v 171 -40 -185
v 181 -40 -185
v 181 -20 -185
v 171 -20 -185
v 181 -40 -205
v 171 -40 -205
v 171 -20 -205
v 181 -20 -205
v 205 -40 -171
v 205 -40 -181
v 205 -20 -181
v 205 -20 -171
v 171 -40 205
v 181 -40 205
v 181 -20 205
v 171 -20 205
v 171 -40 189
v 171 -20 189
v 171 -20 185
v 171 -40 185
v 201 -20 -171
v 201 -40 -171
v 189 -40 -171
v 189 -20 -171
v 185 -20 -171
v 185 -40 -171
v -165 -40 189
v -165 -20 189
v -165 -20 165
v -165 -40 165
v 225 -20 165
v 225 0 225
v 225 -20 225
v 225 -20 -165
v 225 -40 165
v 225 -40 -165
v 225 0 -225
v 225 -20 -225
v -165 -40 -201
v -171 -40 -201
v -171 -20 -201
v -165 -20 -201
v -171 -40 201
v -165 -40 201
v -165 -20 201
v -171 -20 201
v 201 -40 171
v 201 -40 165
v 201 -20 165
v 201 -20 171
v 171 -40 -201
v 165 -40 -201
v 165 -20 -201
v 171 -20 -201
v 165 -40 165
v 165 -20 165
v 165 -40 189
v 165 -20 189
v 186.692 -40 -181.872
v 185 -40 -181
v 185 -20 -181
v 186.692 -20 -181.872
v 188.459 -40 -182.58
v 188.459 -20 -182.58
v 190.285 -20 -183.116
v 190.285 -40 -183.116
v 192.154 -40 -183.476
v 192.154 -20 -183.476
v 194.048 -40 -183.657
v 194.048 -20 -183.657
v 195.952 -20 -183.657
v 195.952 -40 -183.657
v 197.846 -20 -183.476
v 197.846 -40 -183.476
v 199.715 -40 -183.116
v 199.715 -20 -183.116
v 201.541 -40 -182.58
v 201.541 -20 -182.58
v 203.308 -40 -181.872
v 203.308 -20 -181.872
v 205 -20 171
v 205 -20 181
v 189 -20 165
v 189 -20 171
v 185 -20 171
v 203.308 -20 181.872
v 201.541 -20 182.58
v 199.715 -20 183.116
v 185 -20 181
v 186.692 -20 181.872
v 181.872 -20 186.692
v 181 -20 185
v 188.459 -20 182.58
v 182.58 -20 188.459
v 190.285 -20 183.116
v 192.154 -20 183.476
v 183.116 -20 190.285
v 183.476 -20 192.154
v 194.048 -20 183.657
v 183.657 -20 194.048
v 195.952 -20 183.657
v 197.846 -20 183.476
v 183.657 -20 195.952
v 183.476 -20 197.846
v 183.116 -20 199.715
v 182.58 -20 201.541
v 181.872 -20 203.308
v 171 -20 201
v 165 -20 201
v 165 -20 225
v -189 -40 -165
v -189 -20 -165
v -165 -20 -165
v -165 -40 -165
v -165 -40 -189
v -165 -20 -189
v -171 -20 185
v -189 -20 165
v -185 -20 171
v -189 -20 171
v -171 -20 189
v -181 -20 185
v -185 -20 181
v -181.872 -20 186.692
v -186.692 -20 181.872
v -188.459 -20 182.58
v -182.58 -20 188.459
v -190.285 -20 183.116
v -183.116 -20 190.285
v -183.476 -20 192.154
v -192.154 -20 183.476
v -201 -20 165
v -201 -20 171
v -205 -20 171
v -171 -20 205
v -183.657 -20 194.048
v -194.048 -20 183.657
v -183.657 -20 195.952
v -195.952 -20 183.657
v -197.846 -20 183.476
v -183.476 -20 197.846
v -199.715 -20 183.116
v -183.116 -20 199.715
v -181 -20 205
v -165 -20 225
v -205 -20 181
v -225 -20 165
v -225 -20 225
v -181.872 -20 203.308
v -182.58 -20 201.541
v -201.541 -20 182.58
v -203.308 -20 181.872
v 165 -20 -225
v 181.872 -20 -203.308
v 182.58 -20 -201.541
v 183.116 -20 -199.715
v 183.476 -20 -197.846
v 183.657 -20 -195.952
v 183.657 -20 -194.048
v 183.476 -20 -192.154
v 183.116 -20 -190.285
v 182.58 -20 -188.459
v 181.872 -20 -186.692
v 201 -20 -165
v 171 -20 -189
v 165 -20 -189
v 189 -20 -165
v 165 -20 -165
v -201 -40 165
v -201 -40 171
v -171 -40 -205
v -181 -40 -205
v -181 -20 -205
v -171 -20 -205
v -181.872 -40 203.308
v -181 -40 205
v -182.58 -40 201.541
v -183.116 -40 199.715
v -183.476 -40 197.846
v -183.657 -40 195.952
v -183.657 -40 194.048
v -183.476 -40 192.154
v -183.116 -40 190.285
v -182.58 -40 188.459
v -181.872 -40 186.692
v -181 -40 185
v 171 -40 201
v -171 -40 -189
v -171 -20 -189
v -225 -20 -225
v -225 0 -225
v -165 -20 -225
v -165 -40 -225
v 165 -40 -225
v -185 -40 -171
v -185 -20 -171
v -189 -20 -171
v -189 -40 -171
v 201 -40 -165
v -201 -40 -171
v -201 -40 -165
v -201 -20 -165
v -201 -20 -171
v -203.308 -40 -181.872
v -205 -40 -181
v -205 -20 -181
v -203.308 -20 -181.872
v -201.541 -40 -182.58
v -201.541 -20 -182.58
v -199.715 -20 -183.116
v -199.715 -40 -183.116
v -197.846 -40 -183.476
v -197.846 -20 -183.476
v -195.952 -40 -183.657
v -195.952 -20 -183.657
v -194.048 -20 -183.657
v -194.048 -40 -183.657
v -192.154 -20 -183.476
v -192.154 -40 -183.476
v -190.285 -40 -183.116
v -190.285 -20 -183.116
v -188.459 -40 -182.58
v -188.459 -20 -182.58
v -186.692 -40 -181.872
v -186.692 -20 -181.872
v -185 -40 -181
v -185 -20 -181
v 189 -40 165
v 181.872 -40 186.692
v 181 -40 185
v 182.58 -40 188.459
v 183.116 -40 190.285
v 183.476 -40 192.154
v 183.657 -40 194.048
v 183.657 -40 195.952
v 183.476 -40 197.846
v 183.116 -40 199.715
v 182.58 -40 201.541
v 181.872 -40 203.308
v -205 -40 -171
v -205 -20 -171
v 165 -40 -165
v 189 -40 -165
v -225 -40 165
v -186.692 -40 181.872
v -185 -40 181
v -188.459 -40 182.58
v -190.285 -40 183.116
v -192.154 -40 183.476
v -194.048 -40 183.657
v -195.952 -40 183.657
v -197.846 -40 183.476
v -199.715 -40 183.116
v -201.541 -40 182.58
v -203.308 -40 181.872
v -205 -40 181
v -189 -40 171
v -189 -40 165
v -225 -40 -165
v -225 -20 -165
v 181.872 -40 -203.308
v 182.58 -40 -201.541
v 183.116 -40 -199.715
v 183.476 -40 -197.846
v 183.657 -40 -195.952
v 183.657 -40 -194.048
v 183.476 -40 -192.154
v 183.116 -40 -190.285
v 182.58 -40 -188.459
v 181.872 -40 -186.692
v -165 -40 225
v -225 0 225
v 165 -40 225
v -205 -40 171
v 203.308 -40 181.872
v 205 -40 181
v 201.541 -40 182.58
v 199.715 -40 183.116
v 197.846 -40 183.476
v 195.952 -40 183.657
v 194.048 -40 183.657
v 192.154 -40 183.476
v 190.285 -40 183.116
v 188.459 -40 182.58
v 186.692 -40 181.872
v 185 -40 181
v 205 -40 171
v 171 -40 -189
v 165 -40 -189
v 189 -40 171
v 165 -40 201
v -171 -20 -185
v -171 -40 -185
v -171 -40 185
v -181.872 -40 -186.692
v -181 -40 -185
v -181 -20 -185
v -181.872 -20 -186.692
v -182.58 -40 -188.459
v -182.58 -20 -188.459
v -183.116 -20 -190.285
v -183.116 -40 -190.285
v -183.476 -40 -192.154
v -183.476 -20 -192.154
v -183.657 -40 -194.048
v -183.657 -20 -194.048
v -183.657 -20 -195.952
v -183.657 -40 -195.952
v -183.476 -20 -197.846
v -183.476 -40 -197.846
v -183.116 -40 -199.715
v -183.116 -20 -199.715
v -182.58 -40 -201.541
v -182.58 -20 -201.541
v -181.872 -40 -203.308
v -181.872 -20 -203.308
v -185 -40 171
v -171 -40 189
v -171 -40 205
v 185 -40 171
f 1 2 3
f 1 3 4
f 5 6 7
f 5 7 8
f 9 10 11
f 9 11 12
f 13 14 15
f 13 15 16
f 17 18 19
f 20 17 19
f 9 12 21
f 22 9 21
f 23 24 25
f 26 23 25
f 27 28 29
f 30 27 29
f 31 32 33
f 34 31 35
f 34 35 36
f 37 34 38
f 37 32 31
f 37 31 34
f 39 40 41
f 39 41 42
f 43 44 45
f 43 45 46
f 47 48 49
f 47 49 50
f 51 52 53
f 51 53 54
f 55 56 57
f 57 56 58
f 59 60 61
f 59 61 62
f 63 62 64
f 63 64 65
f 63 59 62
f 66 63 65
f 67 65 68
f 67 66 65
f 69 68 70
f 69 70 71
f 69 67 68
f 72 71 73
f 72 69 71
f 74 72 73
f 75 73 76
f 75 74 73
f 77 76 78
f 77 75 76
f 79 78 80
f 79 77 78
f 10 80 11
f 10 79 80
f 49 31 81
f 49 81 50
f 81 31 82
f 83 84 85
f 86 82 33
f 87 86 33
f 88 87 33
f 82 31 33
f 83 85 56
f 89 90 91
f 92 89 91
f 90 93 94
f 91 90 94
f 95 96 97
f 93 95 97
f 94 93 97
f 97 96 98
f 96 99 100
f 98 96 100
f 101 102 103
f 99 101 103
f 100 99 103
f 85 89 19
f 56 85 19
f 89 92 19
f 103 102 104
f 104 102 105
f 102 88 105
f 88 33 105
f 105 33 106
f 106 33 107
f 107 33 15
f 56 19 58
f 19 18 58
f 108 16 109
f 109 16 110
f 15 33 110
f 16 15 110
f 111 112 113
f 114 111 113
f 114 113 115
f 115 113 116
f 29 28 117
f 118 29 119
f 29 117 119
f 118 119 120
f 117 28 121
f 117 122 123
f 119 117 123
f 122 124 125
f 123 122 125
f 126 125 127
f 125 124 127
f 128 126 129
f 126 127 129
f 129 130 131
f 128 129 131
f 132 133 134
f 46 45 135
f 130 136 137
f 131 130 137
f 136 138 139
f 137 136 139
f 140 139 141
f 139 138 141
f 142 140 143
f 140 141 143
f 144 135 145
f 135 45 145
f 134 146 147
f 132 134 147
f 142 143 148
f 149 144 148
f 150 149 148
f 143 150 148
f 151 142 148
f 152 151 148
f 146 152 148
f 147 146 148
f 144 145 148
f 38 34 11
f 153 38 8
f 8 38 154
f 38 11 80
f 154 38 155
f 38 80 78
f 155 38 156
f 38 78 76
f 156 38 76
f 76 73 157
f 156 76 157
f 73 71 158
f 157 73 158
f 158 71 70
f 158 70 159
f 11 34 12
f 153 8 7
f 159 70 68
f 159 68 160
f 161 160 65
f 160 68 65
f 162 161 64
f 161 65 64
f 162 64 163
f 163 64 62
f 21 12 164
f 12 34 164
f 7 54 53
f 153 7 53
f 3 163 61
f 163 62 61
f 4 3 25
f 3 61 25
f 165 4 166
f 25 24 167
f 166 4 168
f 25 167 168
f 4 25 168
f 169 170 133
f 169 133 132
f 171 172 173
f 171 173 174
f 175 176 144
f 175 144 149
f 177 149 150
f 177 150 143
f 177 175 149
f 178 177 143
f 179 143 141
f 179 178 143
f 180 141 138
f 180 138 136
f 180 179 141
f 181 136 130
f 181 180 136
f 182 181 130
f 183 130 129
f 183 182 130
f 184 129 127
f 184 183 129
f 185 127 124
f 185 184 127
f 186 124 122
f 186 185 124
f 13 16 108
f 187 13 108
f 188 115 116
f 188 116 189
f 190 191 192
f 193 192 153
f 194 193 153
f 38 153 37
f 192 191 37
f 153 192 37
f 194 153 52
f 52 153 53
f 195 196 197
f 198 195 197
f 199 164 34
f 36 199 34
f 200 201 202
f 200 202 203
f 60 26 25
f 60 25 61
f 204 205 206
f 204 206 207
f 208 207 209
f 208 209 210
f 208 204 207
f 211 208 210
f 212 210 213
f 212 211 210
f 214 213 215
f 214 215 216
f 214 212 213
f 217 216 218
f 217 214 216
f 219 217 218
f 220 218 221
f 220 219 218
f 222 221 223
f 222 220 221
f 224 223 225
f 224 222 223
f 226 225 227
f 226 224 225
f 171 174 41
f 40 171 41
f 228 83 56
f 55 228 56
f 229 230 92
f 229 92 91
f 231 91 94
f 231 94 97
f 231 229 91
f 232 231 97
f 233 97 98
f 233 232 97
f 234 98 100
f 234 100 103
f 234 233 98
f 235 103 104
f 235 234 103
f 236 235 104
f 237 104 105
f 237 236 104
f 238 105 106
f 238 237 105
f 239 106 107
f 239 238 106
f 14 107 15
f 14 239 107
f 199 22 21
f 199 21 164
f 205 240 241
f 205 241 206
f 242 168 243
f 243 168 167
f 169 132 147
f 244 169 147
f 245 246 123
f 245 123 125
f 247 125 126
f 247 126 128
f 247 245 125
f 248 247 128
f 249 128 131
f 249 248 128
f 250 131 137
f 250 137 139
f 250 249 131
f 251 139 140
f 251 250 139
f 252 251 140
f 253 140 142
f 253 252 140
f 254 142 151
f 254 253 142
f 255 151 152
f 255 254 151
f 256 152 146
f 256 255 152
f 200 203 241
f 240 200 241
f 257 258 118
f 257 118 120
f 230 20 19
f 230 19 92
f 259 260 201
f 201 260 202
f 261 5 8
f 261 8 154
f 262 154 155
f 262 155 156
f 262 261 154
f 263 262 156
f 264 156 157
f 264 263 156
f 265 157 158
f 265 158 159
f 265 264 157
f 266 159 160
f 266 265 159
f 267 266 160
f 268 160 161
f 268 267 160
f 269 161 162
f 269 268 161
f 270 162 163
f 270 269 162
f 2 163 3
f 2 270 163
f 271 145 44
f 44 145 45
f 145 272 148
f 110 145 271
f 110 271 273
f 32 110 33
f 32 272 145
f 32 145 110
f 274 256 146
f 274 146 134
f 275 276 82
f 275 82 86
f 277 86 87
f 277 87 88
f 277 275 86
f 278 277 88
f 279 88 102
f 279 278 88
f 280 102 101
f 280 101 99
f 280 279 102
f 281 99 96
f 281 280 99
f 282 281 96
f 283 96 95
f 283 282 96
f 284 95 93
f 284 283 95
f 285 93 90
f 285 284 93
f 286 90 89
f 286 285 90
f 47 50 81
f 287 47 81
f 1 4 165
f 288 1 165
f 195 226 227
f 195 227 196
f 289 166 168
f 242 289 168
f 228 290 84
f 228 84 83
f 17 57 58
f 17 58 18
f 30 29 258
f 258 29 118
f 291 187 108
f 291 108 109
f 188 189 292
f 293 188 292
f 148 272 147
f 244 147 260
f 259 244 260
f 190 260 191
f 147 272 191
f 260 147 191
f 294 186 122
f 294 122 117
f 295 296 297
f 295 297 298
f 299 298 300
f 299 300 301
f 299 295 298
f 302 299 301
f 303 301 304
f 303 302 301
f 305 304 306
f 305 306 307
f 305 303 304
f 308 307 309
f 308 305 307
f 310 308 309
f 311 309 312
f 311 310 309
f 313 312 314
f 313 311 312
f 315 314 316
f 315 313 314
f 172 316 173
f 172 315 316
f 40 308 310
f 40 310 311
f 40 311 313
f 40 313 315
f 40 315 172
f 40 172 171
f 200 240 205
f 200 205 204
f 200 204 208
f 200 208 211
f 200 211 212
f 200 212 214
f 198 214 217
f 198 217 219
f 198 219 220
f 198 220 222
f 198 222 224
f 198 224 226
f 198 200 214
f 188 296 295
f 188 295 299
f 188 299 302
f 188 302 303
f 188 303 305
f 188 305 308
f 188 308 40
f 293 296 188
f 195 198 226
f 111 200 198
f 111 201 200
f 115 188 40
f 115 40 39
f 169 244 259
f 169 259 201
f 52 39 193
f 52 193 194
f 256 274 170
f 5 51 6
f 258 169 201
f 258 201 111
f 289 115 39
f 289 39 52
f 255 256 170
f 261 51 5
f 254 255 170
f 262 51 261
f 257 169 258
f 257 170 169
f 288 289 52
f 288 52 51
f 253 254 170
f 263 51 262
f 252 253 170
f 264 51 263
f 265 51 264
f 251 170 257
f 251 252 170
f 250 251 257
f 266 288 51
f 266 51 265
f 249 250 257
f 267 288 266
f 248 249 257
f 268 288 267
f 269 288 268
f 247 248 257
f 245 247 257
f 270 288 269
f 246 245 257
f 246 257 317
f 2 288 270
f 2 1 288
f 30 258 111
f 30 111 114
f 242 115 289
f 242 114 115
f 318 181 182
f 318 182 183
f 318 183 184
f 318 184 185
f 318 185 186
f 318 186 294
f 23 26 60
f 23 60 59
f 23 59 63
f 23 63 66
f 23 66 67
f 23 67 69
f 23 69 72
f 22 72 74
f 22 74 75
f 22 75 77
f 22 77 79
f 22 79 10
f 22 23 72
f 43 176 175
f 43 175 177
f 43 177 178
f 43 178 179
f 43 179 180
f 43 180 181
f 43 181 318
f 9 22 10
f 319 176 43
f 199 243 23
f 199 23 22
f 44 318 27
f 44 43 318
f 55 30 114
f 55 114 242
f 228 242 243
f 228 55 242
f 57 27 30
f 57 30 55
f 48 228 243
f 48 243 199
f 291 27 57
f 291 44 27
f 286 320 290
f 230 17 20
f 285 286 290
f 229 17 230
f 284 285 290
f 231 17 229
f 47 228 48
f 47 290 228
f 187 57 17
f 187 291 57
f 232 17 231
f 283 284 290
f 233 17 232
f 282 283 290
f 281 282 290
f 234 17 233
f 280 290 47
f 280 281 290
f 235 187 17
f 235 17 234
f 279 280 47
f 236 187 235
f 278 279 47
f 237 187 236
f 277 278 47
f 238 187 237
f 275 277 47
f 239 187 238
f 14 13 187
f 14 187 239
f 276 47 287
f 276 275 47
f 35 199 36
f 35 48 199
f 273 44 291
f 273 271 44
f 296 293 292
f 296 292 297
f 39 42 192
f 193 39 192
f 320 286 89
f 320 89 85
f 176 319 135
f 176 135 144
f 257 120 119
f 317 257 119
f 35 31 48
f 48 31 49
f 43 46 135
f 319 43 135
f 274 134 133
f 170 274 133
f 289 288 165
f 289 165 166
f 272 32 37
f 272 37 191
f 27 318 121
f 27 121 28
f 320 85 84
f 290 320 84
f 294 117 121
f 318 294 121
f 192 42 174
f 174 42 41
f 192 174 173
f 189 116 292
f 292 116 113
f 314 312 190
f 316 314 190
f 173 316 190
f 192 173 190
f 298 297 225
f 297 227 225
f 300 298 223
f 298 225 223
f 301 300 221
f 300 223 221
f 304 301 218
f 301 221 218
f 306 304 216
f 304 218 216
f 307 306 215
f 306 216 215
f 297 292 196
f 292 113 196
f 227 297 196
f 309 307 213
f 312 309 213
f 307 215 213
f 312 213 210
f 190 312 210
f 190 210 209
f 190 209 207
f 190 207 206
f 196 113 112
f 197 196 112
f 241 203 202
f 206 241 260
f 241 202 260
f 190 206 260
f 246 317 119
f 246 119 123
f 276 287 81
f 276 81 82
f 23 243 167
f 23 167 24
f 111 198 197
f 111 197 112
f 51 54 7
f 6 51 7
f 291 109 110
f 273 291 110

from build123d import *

# Parameters (mm, degrees)
F1_DEPTH = 40
F3_DEPTH = 40
F5_DEPTH = 20


with BuildPart() as f1:
    # F0 (on Front) → F1 (new body)
    with BuildSketch(Plane.XZ):
        Polygon((165, 165), (165, 225), (-165, 225), (-165, 165), (-225, 165), (-225, -165), (-165, -165), (-165, -225), (165, -225), (165, -165), (225, -165), (225, 165), align=None)
    extrude(amount=F1_DEPTH)

    # F2 (on face) → F3 (join, through all)
    with BuildSketch(Plane.XZ.offset(40)):
        with BuildLine():
            Line((-201, 171), (-201, 165))
            Line((-201, 165), (-189, 165))
            Line((-189, 165), (-189, 171))
            Line((-189, 171), (-185, 171))
            Line((-185, 171), (-185, 181))
            ThreePointArc((-185, 181), (-195, 183.6794919243), (-205, 181))
            Line((-205, 181), (-205, 171))
            Line((-205, 171), (-201, 171))
        make_face()
        with BuildLine():
            Line((-171, 189), (-165, 189))
            Line((-165, 189), (-165, 201))
            Line((-165, 201), (-171, 201))
            Line((-171, 201), (-171, 205))
            Line((-171, 205), (-181, 205))
            ThreePointArc((-181, 205), (-183.6794919243, 195), (-181, 185))
            Line((-181, 185), (-171, 185))
            Line((-171, 185), (-171, 189))
        make_face()
        with BuildLine():
            Line((171, 201), (165, 201))
            Line((165, 201), (165, 189))
            Line((165, 189), (171, 189))
            Line((171, 189), (171, 185))
            Line((171, 185), (181, 185))
            ThreePointArc((181, 185), (183.6794919243, 195), (181, 205))
            Line((181, 205), (171, 205))
            Line((171, 205), (171, 201))
        make_face()
        with BuildLine():
            Line((189, 171), (189, 165))
            Line((189, 165), (201, 165))
            Line((201, 165), (201, 171))
            Line((201, 171), (205, 171))
            Line((205, 171), (205, 181))
            ThreePointArc((205, 181), (195, 183.6794919243), (185, 181))
            Line((185, 181), (185, 171))
            Line((185, 171), (189, 171))
        make_face()
        with BuildLine():
            Line((201, -165), (189, -165))
            Line((189, -165), (189, -171))
            Line((189, -171), (185, -171))
            Line((185, -171), (185, -181))
            ThreePointArc((185, -181), (195, -183.6794919243), (205, -181))
            Line((205, -181), (205, -171))
            Line((205, -171), (201, -171))
            Line((201, -171), (201, -165))
        make_face()
        with BuildLine():
            Line((165, -189), (165, -201))
            Line((165, -201), (171, -201))
            Line((171, -201), (171, -205))
            Line((171, -205), (181, -205))
            ThreePointArc((181, -205), (183.6794919243, -195), (181, -185))
            Line((181, -185), (171, -185))
            Line((171, -185), (171, -189))
            Line((171, -189), (165, -189))
        make_face()
        with BuildLine():
            Line((-165, -201), (-165, -189))
            Line((-165, -189), (-171, -189))
            Line((-171, -189), (-171, -185))
            Line((-171, -185), (-181, -185))
            ThreePointArc((-181, -185), (-183.6794919243, -195), (-181, -205))
            Line((-181, -205), (-171, -205))
            Line((-171, -205), (-171, -201))
            Line((-171, -201), (-165, -201))
        make_face()
        with BuildLine():
            Line((-189, -165), (-201, -165))
            Line((-201, -165), (-201, -171))
            Line((-201, -171), (-205, -171))
            Line((-205, -171), (-205, -181))
            ThreePointArc((-205, -181), (-195, -183.6794919243), (-185, -181))
            Line((-185, -181), (-185, -171))
            Line((-185, -171), (-189, -171))
            Line((-189, -171), (-189, -165))
        make_face()
    extrude(amount=-F3_DEPTH)

    # F4 (on face) → F5 (join)
    with BuildSketch(Plane(origin=(0, 0, 0), x_dir=(-1, 0, 0), z_dir=(0, 1, 0))):
        Polygon((165, 201), (165, 225), (-165, 225), (-165, 201), (-165, 189), (-165, 165), (-189, 165), (-201, 165), (-225, 165), (-225, -165), (-201, -165), (-189, -165), (-165, -165), (-165, -189), (-165, -201), (-165, -225), (165, -225), (165, -201), (165, -189), (165, -165), (189, -165), (201, -165), (225, -165), (225, 165), (201, 165), (189, 165), (165, 165), (165, 189), align=None)
        with BuildLine():
            Line((225, -225), (225, -165))
            Line((225, -165), (201, -165))
            Line((201, -165), (201, -171))
            Line((201, -171), (205, -171))
            Line((205, -171), (205, -181))
            ThreePointArc((205, -181), (195, -183.6794919243), (185, -181))
            Line((185, -181), (185, -171))
            Line((185, -171), (189, -171))
            Line((189, -171), (189, -165))
            Line((189, -165), (165, -165))
            Line((165, -165), (165, -189))
            Line((165, -189), (171, -189))
            Line((171, -189), (171, -185))
            Line((171, -185), (181, -185))
            ThreePointArc((181, -185), (183.6794919243, -195), (181, -205))
            Line((181, -205), (171, -205))
            Line((171, -205), (171, -201))
            Line((171, -201), (165, -201))
            Line((165, -201), (165, -225))
            Line((165, -225), (225, -225))
        make_face()
        with BuildLine():
            Line((-201, -165), (-225, -165))
            Line((-225, -165), (-225, -225))
            Line((-225, -225), (-165, -225))
            Line((-165, -225), (-165, -201))
            Line((-165, -201), (-171, -201))
            Line((-171, -201), (-171, -205))
            Line((-171, -205), (-181, -205))
            ThreePointArc((-181, -205), (-183.6794919243, -195), (-181, -185))
            Line((-181, -185), (-171, -185))
            Line((-171, -185), (-171, -189))
            Line((-171, -189), (-165, -189))
            Line((-165, -189), (-165, -165))
            Line((-165, -165), (-189, -165))
            Line((-189, -165), (-189, -171))
            Line((-189, -171), (-185, -171))
            Line((-185, -171), (-185, -181))
            ThreePointArc((-185, -181), (-195, -183.6794919243), (-205, -181))
            Line((-205, -181), (-205, -171))
            Line((-205, -171), (-201, -171))
            Line((-201, -171), (-201, -165))
        make_face()
        with BuildLine():
            Line((-165, 201), (-165, 225))
            Line((-165, 225), (-225, 225))
            Line((-225, 225), (-225, 165))
            Line((-225, 165), (-201, 165))
            Line((-201, 165), (-201, 171))
            Line((-201, 171), (-205, 171))
            Line((-205, 171), (-205, 181))
            ThreePointArc((-205, 181), (-195, 183.6794919243), (-185, 181))
            Line((-185, 181), (-185, 171))
            Line((-185, 171), (-189, 171))
            Line((-189, 171), (-189, 165))
            Line((-189, 165), (-165, 165))
            Line((-165, 165), (-165, 189))
            Line((-165, 189), (-171, 189))
            Line((-171, 189), (-171, 185))
            Line((-171, 185), (-181, 185))
            ThreePointArc((-181, 185), (-183.6794919243, 195), (-181, 205))
            Line((-181, 205), (-171, 205))
            Line((-171, 205), (-171, 201))
            Line((-171, 201), (-165, 201))
        make_face()
        with BuildLine():
            Line((225, 165), (225, 225))
            Line((225, 225), (165, 225))
            Line((165, 225), (165, 201))
            Line((165, 201), (171, 201))
            Line((171, 201), (171, 205))
            Line((171, 205), (181, 205))
            ThreePointArc((181, 205), (183.6794919243, 195), (181, 185))
            Line((181, 185), (171, 185))
            Line((171, 185), (171, 189))
            Line((171, 189), (165, 189))
            Line((165, 189), (165, 165))
            Line((165, 165), (189, 165))
            Line((189, 165), (189, 171))
            Line((189, 171), (185, 171))
            Line((185, 171), (185, 181))
            ThreePointArc((185, 181), (195, 183.6794919243), (205, 181))
            Line((205, 181), (205, 171))
            Line((205, 171), (201, 171))
            Line((201, 171), (201, 165))
            Line((201, 165), (225, 165))
        make_face()
    extrude(amount=-F5_DEPTH)


solid = f1.part
